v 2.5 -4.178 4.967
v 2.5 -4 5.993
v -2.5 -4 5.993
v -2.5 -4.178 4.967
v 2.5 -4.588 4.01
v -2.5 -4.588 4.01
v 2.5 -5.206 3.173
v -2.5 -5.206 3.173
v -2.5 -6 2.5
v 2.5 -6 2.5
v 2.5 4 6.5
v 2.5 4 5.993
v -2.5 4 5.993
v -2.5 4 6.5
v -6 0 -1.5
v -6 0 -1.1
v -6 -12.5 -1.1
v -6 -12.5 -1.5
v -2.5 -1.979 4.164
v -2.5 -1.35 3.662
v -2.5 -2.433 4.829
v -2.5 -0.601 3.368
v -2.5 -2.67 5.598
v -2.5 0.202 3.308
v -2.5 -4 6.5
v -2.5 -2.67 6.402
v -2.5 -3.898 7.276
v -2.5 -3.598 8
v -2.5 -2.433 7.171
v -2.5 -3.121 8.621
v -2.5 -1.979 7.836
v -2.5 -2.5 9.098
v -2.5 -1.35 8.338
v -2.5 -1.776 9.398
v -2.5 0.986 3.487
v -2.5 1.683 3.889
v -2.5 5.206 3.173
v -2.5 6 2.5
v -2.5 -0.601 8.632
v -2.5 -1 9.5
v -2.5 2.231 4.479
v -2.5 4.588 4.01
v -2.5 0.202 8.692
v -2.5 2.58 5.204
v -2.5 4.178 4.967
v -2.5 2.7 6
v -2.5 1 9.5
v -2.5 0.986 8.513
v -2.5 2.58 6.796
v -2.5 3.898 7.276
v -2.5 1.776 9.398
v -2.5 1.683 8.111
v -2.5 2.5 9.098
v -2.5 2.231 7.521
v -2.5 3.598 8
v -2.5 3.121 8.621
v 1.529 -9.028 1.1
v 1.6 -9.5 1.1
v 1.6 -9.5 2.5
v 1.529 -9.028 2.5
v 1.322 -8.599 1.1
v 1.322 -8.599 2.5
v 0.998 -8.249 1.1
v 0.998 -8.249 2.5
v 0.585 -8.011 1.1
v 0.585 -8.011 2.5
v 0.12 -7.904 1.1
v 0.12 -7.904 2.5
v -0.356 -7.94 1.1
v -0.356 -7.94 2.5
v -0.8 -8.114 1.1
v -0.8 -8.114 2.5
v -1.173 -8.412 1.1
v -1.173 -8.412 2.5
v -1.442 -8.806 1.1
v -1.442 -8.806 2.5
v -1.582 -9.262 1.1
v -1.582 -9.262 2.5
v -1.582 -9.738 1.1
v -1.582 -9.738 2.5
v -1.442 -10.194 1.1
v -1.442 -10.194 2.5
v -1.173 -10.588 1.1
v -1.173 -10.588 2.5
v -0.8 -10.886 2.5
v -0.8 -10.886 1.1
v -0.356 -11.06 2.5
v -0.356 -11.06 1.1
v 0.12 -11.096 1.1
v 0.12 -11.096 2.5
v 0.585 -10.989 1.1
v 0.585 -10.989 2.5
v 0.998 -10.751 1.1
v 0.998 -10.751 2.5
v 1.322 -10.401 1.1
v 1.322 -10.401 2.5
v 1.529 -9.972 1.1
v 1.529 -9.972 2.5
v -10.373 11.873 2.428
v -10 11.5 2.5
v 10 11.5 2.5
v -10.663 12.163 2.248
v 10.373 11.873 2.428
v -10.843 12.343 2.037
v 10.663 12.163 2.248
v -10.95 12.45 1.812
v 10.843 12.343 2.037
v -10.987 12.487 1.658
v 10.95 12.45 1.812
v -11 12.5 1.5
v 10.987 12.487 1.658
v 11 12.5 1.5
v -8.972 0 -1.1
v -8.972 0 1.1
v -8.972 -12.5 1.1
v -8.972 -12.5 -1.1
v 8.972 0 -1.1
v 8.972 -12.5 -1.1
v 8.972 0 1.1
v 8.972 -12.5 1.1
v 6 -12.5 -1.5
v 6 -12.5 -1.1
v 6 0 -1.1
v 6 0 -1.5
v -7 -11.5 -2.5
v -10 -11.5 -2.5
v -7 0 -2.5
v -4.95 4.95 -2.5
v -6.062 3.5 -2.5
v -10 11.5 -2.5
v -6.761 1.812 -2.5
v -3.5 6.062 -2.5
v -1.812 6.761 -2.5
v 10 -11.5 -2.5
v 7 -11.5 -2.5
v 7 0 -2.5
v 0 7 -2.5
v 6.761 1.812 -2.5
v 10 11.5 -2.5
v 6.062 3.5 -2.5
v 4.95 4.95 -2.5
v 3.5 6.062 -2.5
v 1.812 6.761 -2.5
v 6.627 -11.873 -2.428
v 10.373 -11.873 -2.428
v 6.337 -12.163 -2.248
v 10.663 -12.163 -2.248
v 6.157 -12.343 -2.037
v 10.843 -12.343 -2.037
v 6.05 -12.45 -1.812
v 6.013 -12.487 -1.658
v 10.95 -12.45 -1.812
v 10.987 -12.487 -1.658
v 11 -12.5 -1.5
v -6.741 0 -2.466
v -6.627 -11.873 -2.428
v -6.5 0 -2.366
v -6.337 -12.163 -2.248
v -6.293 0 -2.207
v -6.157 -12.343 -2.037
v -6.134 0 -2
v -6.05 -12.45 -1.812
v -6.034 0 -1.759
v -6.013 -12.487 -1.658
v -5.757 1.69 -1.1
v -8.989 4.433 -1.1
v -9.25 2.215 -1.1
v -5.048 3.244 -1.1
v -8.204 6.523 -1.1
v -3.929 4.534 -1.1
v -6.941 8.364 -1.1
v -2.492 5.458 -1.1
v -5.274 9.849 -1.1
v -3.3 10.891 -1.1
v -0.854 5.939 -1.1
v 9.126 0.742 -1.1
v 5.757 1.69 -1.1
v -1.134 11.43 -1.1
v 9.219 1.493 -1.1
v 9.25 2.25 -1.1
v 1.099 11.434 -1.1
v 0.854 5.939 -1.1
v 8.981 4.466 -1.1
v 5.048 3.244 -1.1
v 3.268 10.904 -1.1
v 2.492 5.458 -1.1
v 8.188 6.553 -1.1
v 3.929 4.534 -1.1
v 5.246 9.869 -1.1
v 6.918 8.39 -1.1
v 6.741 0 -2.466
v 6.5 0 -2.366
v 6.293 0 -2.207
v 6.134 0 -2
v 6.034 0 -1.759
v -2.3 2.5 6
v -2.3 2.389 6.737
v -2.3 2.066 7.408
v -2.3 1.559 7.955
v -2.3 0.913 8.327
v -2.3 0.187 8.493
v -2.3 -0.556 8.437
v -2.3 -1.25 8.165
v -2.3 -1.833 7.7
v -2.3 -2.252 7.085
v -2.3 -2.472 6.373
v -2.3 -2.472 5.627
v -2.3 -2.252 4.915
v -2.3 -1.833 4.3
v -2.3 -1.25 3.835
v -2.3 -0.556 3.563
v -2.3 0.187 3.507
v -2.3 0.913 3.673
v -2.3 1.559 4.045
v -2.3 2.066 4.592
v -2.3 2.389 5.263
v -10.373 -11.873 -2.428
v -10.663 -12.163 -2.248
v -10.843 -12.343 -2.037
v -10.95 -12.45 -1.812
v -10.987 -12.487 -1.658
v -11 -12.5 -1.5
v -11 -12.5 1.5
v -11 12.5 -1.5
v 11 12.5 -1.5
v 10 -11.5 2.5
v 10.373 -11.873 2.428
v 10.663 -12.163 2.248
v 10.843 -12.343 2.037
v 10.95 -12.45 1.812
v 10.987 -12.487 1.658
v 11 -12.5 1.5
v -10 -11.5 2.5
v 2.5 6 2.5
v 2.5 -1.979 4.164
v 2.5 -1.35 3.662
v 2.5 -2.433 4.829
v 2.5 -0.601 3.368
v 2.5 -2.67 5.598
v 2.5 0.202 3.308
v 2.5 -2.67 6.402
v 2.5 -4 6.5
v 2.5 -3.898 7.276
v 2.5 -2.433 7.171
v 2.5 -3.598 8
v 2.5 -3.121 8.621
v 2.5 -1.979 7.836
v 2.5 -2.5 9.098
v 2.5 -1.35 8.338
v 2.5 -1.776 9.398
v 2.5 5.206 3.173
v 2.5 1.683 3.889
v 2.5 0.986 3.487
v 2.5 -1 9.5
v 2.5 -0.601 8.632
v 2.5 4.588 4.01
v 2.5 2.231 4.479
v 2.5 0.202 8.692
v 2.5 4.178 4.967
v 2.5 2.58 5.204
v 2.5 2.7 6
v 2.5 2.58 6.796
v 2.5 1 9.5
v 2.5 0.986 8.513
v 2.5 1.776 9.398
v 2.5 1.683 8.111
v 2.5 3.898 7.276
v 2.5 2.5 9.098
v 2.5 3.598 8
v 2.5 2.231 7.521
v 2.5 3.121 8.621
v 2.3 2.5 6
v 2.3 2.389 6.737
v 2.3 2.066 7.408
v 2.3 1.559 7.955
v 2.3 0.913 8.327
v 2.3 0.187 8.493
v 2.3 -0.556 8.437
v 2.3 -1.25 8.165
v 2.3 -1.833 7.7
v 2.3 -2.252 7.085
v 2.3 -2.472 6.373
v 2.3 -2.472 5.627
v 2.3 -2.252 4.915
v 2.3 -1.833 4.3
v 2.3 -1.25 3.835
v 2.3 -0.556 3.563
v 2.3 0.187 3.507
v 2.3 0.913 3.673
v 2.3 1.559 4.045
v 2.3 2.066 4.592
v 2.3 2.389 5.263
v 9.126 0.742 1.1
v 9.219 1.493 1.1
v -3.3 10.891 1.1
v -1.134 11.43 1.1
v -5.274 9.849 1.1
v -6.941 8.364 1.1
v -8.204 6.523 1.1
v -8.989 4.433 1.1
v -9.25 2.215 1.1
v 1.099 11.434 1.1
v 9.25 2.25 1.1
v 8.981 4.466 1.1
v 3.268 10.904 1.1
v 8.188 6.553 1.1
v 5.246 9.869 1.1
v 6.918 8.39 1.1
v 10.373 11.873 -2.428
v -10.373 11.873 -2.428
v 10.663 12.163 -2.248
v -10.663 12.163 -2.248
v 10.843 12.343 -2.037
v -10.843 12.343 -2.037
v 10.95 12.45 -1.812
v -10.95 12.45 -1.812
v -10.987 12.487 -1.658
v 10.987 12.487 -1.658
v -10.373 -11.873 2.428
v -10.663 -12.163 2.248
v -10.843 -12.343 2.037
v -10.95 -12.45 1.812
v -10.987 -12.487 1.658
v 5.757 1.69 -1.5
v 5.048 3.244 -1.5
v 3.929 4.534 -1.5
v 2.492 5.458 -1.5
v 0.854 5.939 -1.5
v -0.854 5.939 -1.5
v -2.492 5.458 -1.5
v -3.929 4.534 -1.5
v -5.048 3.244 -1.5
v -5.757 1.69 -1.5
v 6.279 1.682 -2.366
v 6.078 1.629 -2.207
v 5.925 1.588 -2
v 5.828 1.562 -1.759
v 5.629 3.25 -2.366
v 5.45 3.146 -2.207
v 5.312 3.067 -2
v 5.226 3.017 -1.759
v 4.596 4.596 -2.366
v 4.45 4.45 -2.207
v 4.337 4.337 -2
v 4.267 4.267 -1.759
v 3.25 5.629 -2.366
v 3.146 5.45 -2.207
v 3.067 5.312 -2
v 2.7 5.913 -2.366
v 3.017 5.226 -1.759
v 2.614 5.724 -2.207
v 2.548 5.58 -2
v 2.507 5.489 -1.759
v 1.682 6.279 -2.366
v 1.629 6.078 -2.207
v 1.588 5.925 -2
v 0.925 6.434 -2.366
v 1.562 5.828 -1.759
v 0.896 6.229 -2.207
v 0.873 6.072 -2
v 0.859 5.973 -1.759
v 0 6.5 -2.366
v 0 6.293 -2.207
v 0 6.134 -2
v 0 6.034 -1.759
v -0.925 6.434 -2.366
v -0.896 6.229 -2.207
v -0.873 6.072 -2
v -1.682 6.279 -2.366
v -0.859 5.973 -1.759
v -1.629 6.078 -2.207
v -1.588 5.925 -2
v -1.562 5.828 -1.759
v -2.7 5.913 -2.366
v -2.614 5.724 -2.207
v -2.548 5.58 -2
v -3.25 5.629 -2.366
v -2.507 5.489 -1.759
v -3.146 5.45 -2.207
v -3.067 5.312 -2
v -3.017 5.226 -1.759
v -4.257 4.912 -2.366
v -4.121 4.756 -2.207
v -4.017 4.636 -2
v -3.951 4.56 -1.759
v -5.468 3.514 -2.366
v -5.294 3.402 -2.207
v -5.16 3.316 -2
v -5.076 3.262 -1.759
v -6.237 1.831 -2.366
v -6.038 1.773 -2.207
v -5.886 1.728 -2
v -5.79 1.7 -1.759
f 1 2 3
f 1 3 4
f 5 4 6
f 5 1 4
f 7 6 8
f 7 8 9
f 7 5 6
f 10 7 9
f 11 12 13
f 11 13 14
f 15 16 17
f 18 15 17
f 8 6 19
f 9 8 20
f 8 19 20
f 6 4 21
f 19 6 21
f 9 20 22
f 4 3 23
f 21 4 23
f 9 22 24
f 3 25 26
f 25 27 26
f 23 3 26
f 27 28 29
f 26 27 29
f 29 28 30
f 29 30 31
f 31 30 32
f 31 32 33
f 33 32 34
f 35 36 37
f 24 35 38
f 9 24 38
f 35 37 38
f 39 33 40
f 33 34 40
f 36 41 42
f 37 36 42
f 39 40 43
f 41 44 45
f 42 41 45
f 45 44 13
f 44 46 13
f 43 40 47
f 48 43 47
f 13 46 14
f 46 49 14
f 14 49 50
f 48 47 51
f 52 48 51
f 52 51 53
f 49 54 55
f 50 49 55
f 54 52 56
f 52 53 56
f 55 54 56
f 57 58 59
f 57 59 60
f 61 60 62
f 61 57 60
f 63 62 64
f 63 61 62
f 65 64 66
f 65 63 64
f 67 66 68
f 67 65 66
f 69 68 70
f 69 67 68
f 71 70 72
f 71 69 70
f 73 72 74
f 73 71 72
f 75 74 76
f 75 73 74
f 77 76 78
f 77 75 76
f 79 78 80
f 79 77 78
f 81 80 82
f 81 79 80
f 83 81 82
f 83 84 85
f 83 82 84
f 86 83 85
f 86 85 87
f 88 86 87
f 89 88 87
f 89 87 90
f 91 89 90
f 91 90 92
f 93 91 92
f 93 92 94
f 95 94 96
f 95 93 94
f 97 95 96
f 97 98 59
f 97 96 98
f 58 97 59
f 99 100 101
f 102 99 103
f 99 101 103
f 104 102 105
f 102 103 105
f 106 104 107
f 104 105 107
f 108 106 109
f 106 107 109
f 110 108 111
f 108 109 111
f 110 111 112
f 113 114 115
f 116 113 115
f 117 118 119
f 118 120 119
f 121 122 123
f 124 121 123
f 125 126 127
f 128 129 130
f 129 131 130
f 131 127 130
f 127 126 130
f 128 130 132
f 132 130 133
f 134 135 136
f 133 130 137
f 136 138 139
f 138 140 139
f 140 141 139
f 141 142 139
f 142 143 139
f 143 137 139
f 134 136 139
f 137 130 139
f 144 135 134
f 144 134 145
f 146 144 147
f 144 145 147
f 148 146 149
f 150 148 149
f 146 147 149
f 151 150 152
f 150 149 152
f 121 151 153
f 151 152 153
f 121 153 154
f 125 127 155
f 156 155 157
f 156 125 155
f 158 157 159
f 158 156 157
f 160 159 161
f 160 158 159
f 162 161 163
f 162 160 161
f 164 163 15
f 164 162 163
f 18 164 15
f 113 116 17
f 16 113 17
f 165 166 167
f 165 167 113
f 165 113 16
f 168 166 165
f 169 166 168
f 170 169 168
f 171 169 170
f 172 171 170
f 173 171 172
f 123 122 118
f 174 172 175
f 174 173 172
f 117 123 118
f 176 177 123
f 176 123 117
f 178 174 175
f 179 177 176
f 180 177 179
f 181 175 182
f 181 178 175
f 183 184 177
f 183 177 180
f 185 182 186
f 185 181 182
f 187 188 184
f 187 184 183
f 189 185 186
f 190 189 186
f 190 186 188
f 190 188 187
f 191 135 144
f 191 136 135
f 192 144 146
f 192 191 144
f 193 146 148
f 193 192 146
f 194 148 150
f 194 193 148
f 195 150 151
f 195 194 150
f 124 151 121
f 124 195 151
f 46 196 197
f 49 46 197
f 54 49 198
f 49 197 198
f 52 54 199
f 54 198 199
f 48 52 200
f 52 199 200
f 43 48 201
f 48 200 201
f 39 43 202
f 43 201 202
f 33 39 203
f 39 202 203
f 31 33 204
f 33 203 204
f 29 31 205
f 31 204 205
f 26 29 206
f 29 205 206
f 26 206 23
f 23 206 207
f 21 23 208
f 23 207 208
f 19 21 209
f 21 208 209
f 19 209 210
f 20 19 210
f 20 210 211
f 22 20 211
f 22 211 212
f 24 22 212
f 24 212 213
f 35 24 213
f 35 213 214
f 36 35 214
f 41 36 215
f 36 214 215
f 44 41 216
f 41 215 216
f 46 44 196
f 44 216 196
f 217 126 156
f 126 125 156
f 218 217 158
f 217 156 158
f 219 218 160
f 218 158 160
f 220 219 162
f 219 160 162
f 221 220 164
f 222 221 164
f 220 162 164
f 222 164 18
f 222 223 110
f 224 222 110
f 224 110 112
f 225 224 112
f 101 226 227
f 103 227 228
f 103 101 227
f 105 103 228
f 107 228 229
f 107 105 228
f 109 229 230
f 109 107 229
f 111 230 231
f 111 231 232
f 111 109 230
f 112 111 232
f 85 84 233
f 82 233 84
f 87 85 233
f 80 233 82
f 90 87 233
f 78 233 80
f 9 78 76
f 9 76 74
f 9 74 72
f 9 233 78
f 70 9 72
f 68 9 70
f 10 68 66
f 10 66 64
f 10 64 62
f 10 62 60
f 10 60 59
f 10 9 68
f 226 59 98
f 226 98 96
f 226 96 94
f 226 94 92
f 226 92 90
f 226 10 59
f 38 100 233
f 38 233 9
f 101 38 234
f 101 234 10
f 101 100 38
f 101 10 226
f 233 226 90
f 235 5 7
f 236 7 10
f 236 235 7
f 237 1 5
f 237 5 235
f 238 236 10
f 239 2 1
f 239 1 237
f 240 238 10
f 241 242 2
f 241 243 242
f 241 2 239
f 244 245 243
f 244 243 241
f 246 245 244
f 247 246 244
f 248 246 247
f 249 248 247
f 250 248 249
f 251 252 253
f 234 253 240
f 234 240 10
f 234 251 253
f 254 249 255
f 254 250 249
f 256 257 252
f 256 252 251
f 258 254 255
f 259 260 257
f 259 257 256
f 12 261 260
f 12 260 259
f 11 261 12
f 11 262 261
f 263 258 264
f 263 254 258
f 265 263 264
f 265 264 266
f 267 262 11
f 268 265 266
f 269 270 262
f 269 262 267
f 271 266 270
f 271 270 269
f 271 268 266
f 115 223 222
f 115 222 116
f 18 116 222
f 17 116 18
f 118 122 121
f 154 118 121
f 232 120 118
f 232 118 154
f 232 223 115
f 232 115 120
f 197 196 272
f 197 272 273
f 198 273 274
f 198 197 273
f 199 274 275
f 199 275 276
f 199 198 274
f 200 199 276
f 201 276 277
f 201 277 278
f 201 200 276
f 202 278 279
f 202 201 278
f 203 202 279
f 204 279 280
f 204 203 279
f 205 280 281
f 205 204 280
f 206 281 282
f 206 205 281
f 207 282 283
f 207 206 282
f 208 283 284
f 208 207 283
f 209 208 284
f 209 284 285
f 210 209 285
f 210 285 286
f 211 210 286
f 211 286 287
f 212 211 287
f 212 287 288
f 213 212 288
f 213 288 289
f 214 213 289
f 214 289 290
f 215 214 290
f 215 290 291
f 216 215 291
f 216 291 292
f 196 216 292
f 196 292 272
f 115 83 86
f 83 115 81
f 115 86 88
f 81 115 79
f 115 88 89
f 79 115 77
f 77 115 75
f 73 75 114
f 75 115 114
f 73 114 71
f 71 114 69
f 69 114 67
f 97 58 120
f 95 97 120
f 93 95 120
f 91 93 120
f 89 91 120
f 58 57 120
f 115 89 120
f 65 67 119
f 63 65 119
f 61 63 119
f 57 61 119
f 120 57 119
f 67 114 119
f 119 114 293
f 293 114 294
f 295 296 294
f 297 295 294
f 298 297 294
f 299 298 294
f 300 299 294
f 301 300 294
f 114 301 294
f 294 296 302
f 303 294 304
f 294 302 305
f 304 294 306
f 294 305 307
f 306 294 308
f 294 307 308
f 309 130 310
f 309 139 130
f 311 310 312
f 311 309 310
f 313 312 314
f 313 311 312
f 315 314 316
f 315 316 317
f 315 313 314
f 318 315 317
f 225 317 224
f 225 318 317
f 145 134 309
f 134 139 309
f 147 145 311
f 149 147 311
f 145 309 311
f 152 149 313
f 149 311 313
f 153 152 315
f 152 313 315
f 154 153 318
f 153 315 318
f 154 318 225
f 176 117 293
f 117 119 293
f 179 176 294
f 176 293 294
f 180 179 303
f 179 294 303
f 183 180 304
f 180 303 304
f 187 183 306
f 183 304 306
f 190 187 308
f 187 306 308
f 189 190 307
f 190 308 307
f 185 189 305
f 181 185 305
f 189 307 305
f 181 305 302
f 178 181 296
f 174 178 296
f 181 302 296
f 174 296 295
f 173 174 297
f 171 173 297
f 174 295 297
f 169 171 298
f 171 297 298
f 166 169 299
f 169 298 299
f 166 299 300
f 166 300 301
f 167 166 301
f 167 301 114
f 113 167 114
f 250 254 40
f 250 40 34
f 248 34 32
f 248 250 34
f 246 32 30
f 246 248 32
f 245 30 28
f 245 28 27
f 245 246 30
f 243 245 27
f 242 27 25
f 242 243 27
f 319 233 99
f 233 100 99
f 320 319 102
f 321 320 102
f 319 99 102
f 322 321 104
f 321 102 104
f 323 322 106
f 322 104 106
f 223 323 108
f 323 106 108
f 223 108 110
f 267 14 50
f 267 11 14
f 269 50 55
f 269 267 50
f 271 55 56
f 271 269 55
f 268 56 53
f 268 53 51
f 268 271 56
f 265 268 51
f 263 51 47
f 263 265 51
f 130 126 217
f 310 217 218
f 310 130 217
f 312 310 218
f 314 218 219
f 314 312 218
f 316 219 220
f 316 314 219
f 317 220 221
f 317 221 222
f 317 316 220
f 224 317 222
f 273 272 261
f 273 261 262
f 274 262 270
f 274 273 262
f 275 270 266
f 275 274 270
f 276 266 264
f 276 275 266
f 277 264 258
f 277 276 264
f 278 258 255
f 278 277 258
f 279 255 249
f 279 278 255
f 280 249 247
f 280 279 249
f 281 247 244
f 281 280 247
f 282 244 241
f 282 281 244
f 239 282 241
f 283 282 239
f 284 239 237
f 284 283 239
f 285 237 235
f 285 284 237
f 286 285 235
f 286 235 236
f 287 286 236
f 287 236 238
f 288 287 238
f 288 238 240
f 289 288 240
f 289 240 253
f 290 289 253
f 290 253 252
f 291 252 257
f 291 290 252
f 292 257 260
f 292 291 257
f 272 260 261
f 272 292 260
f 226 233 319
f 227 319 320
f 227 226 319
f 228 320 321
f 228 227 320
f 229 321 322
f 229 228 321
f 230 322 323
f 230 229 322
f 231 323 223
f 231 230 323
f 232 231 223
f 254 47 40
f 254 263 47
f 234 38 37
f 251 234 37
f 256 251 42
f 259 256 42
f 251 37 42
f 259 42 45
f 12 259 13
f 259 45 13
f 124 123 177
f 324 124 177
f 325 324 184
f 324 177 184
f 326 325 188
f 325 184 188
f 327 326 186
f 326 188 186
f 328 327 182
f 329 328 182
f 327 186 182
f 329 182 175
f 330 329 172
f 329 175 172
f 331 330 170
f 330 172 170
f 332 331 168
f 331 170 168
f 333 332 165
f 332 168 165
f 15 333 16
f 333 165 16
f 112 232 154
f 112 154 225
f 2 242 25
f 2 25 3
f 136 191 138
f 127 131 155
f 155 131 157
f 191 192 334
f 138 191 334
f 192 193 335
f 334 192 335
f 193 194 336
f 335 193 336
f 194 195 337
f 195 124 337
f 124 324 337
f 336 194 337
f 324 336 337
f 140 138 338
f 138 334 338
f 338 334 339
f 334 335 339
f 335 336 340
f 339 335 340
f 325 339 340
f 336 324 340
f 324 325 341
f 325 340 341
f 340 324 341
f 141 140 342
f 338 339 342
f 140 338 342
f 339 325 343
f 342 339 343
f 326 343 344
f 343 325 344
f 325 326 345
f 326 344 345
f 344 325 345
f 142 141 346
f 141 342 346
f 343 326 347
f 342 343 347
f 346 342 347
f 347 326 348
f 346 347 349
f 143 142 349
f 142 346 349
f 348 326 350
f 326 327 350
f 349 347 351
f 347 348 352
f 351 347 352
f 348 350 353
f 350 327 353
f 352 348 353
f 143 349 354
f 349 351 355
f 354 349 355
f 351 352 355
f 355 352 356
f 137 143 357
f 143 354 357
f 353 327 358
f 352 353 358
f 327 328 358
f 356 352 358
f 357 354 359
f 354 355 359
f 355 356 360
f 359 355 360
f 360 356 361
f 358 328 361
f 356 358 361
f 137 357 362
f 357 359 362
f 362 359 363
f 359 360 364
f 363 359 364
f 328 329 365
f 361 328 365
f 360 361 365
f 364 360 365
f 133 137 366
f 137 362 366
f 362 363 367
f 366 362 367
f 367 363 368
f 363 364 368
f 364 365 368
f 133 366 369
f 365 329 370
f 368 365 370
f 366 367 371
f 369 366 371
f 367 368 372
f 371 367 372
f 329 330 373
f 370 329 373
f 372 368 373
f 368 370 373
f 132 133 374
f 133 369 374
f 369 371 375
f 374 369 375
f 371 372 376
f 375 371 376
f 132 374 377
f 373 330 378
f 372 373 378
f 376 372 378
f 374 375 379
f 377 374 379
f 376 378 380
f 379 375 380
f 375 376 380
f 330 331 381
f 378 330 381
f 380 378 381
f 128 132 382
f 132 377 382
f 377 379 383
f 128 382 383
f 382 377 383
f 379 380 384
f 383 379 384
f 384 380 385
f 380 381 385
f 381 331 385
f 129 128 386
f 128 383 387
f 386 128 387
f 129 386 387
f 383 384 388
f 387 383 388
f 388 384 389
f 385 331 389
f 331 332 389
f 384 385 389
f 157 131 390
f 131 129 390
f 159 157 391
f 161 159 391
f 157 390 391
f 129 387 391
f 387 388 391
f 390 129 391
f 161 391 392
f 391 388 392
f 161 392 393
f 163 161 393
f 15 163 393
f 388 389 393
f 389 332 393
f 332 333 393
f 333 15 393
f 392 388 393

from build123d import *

# Parameters (mm, degrees)
F0_W      = 22
F0_H      = 25
F1_DEPTH  = 2.5
F3_DEPTH  = 1.1
F5_DEPTH  = 25
F6_R      = 1.6
F7_DEPTH  = 29.4
F8_R      = 2.5
F9_DEPTH  = 2.5
F11_DEPTH = 2.5
F12_R     = 1
F13_SIZE  = 0.2


with BuildPart() as f1:
    # F0 (on Top) → F1 (new body, symmetric)
    with BuildSketch(Plane.XY):
        Rectangle(F0_W, F0_H)
    extrude(amount=F1_DEPTH, both=True)

    # F2 (on Top) → F3 (cut, symmetric)
    with BuildSketch(Plane.XY):
        with BuildLine():
            ThreePointArc((8.9721792225, 0), (9.180282071, 1.1164563987), (9.25, 2.25))
            ThreePointArc((9.25, 2.25), (-1.1335436013, 11.430282071), (-8.9721792225, 0))
            ThreePointArc((-8.9721792225, 0), (0, -7), (8.9721792225, 0))
        make_face()
        with BuildLine():
            ThreePointArc((8.9721792225, 0), (0, -7), (-8.9721792225, 0))
            Line((-8.9721792225, 0), (-8.9721792225, -12.5))
            Line((-8.9721792225, -12.5), (8.9721792225, -12.5))
            Line((8.9721792225, -12.5), (8.9721792225, 0))
        make_face()
    extrude(amount=F3_DEPTH, both=True, mode=Mode.SUBTRACT)

    # F4 (on Top) → F5 (cut)
    with BuildSketch(Plane.XY):
        with BuildLine():
            ThreePointArc((-6, 0), (0, -6), (6, 0))
            ThreePointArc((6, 0), (0, 6), (-6, 0))
        make_face()
        with BuildLine():
            Line((6, -12.5), (6, 0))
            ThreePointArc((6, 0), (0, -6), (-6, 0))
            Line((-6, 0), (-6, -12.5))
            Line((-6, -12.5), (6, -12.5))
        make_face()
    extrude(amount=-F5_DEPTH, mode=Mode.SUBTRACT)

    # F6 (on Top) → F7 (cut)
    with BuildSketch(Plane.XY):
        with Locations((0, -9.5)):
            Circle(F6_R)
    extrude(amount=F7_DEPTH, mode=Mode.SUBTRACT)

    # F8 (on Right) → F9 (join, symmetric)
    with BuildSketch(Plane.YZ):
        with BuildLine():
            Line((1, 9.5), (-1, 9.5))
            ThreePointArc((-1, 9.5), (-3.1213203436, 8.6213203436), (-4, 6.5))
            Line((-4, 6.5), (-4, 2.5))
            Line((-4, 2.5), (4, 2.5))
            Line((4, 2.5), (4, 6.5))
            ThreePointArc((4, 6.5), (3.1213203436, 8.6213203436), (1, 9.5))
        make_face()
        with Locations((0, 6)):
            Circle(F8_R, mode=Mode.SUBTRACT)
    extrude(amount=F9_DEPTH, both=True)

    # F10 (on Right) → F11 (join, symmetric)
    with BuildSketch(Plane.YZ):
        with BuildLine():
            ThreePointArc((4, 6.5), (3.9928498393, 6.2464249197), (4, 5.9928498393))
            Line((4, 5.9928498393), (4, 6.5))
        make_face()
        with BuildLine():
            Line((4, 2.5), (6, 2.5))
            ThreePointArc((6, 2.5), (4.5877250014, 4.0103569422), (4, 5.9928498393))
            Line((4, 5.9928498393), (4, 2.5))
        make_face()
        with BuildLine():
            ThreePointArc((-4, 5.9928498393), (-4.5877250014, 4.0103569422), (-6, 2.5))
            Line((-6, 2.5), (-4, 2.5))
            Line((-4, 2.5), (-4, 5.9928498393))
        make_face()
        with BuildLine():
            Line((-4, 6.5), (-4, 5.9928498393))
            ThreePointArc((-4, 5.9928498393), (-3.9928498393, 6.2464249197), (-4, 6.5))
        make_face()
    extrude(amount=F11_DEPTH, both=True)

    # F12
    f12_edges = [f1.edges().sort_by_distance(p)[0] for p in [
        (-11, 0, -2.5),
        (-11, 0, 2.5),
        (11, 0, 2.5),
        (11, 0, -2.5),
        (0, -12.5, 2.5),
        (0, 12.5, 2.5),
        (0, 12.5, -2.5),
        (8.5, -12.5, -2.5),
        (-8.5, -12.5, -2.5),
        (6, -6.25, -2.5),
    ]]
    fillet(f12_edges, radius=F12_R)

    # F13
    f13_edges = [f1.edges().sort_by_distance(p)[0] for p in [
        (2.5, -2.5, 6),
        (-2.5, -2.5, 6),
    ]]
    chamfer(f13_edges, length=F13_SIZE)


solid = f1.part
